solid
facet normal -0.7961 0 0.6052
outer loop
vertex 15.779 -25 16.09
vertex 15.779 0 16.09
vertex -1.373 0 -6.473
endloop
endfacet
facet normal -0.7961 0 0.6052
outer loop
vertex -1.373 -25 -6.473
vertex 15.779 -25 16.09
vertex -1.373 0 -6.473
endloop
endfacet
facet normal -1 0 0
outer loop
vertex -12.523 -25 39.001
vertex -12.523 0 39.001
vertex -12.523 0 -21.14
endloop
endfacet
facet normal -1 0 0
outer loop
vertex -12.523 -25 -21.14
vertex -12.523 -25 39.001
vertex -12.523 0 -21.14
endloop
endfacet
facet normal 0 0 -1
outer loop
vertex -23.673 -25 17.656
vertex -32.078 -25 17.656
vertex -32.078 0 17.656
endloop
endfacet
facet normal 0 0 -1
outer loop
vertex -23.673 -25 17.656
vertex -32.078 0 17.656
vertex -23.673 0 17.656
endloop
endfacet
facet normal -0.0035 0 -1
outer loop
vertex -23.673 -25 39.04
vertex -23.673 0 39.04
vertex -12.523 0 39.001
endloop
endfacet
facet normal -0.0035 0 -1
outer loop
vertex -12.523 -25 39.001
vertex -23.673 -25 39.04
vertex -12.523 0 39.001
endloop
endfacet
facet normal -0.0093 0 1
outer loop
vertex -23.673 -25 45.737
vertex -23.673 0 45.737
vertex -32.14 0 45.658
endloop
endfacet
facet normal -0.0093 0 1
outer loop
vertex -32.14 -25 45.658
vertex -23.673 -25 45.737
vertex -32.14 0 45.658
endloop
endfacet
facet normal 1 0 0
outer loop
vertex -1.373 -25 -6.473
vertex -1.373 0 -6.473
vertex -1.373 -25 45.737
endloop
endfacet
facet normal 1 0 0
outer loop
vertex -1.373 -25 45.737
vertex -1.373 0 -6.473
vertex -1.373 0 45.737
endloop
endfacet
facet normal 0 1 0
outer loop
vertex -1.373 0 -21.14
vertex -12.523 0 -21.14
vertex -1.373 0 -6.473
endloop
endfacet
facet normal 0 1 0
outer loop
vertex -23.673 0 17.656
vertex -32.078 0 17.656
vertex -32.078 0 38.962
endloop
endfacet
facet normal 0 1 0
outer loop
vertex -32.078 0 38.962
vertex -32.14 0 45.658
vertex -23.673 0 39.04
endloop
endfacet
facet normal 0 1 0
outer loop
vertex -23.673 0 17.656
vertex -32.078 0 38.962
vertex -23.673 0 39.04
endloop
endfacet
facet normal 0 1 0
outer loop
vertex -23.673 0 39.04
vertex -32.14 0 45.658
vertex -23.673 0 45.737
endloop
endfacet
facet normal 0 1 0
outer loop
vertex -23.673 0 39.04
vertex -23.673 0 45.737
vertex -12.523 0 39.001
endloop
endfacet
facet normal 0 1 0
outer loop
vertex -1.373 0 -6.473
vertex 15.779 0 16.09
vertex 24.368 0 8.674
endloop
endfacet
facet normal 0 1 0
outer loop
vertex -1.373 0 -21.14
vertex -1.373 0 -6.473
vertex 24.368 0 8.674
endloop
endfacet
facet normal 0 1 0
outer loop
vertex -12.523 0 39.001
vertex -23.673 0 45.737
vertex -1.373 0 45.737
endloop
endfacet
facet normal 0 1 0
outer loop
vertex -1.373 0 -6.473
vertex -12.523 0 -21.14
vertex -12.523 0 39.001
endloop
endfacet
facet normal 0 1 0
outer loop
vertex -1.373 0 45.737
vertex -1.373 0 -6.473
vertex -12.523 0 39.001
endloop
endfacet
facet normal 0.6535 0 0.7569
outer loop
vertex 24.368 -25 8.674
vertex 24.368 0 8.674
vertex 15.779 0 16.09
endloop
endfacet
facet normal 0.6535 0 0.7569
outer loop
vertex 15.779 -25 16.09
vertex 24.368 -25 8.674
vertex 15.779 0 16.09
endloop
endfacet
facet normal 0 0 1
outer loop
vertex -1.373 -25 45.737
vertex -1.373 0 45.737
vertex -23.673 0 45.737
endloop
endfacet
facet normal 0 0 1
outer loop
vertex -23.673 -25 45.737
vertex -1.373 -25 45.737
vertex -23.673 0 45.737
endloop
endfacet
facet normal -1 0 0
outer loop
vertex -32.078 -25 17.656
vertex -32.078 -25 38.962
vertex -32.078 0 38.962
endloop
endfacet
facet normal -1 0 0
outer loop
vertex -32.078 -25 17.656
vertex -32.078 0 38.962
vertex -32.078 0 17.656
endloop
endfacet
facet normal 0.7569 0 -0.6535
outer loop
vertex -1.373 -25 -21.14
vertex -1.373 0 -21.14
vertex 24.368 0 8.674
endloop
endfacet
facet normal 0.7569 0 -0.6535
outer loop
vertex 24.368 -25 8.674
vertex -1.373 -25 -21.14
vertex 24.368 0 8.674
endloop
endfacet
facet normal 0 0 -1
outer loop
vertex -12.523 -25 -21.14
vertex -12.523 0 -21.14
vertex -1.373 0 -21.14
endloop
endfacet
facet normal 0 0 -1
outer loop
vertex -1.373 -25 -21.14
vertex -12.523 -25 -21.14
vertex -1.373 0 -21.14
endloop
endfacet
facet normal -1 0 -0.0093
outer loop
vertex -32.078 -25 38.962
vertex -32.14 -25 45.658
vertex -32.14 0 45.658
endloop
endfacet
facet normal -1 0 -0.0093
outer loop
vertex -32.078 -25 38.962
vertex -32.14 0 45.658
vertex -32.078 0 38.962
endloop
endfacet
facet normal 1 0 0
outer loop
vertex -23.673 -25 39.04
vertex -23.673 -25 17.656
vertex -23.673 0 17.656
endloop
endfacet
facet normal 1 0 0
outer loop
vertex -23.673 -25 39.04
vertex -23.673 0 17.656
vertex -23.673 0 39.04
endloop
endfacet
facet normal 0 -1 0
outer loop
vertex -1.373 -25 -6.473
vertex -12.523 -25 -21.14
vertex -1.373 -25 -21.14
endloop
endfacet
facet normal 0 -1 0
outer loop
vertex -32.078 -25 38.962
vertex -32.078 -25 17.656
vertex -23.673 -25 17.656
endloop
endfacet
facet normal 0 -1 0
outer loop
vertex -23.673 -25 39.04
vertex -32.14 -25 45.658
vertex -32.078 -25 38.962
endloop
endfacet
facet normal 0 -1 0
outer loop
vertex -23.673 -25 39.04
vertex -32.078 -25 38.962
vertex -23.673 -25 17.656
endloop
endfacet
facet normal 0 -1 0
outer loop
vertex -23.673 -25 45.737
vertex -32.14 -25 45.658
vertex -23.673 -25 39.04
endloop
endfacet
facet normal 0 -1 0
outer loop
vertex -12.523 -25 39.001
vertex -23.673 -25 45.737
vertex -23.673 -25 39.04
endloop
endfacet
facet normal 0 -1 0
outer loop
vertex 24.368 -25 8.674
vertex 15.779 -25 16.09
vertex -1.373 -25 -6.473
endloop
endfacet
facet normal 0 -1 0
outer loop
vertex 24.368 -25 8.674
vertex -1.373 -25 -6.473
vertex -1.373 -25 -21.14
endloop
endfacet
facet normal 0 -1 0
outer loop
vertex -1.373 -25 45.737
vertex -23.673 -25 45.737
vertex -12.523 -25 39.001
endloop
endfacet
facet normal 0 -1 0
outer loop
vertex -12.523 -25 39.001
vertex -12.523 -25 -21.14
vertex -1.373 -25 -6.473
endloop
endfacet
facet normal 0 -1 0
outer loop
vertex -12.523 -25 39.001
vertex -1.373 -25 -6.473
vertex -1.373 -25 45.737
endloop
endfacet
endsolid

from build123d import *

# Parameters (mm, degrees)
F1_DEPTH = 25


with BuildPart() as f1:
    # F0 (on Front) → F1 (new body)
    with BuildSketch(Plane.XZ):
        Polygon((-23.6734980222, 39.0396707756), (-32.0782363415, 38.9619767666), (-32.0782363415, 17.6561103577), (-23.6734980222, 17.6561103577), align=None)
        Polygon((-32.1401390579, 45.6584536185), (-32.0782363415, 38.9619767666), (-23.6734980222, 39.0396707756), (-12.5234980222, 39.0008237711), (-12.5234980222, 45.7367198607), (-23.6734980222, 45.7367198607), align=None)
        Polygon((-12.5234980222, 45.7367198607), (-12.5234980222, 39.0008237711), (-1.3734980222, 38.9619767666), align=None)
        Polygon((-1.3734980222, 38.9619767666), (-12.5234980222, 39.0008237711), (-12.5234980222, -21.1397777129), (-1.3734980222, -6.4730470867), align=None)
        Polygon((-12.5234980222, 45.7367198607), (-1.3734980222, 38.9619767666), (-1.3734980222, 45.7367198607), align=None)
        Polygon((-1.3734980222, -6.4730470867), (-12.5234980222, -21.1397777129), (-1.3734980222, -21.1397777129), align=None)
        Polygon((15.7792718965, 16.0897381949), (-1.3734980222, -6.4730470867), (-1.3734980222, -21.1397777129), (24.3684463203, 8.6735142395), align=None)
    extrude(amount=F1_DEPTH)


solid = f1.part
